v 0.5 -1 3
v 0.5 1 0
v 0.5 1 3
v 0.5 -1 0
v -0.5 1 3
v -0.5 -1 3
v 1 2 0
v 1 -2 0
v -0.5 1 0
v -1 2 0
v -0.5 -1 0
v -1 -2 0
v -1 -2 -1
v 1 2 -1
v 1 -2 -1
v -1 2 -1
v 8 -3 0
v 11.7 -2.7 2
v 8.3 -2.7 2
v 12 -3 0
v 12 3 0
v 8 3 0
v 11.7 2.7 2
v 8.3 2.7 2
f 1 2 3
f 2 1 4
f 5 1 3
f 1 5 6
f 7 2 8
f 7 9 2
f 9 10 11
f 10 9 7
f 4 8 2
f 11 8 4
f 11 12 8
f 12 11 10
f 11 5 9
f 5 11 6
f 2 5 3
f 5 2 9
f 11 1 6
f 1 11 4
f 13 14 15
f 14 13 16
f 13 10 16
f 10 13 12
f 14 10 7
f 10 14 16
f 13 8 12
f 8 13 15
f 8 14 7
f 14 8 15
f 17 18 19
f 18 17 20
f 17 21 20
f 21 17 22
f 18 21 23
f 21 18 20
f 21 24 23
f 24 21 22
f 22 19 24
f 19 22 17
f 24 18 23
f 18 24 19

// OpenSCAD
// ### Usage #########################################################
prism([1, 2, 3]);
prism([2, 4, 1], invert = true);

translate([10, 0, 0])
tapered_cuboid([4, 6, 2], 0.3);


// ### Module ########################################################

// A cube with center centered on the base
// dims - cube dimensions: [x, y, z]
// invert - center is on top
module prism(dims, invert = false) {
	if (invert) {
		rotate([180, 0, 0])
		base_prism(dims);
	} else {
		base_prism(dims);
	}
}

module base_prism(dims) {
	translate([0, 0, dims[2] / 2])
	cube(dims, center = true);
}


// A cuboid with a tapered top
// dims - cube dimensions: [x, y, z]
// taper - by how much to taper the each edge at the top
module tapered_cuboid(dims, taper) {
  ho = taper;
  hx = dims.x - taper;
  hy = dims.y - taper;
  translate([-dims.x/2, -dims.y/2, 0])
  polyhedron( 
    points=[
      [     0,      0,      0],
      [ taper,  taper, dims.z],
      [    hx,  taper, dims.z],
      [dims.x,      0,      0],
      [     0, dims.y,      0],
      [ taper,     hy, dims.z],
      [    hx,     hy, dims.z],
      [dims.x, dims.y,      0] 
    ],
    faces = [
      //side face
      [0, 1, 2, 3],
      //side face
      [3, 2, 6, 7],
      //side face
      [7, 6, 5, 4],
      //side face
      [4, 5, 1, 0],
      //top face
      [1, 5, 6, 2],
      //bottom face
      [4, 0, 3, 7],
    ]
  );
}
